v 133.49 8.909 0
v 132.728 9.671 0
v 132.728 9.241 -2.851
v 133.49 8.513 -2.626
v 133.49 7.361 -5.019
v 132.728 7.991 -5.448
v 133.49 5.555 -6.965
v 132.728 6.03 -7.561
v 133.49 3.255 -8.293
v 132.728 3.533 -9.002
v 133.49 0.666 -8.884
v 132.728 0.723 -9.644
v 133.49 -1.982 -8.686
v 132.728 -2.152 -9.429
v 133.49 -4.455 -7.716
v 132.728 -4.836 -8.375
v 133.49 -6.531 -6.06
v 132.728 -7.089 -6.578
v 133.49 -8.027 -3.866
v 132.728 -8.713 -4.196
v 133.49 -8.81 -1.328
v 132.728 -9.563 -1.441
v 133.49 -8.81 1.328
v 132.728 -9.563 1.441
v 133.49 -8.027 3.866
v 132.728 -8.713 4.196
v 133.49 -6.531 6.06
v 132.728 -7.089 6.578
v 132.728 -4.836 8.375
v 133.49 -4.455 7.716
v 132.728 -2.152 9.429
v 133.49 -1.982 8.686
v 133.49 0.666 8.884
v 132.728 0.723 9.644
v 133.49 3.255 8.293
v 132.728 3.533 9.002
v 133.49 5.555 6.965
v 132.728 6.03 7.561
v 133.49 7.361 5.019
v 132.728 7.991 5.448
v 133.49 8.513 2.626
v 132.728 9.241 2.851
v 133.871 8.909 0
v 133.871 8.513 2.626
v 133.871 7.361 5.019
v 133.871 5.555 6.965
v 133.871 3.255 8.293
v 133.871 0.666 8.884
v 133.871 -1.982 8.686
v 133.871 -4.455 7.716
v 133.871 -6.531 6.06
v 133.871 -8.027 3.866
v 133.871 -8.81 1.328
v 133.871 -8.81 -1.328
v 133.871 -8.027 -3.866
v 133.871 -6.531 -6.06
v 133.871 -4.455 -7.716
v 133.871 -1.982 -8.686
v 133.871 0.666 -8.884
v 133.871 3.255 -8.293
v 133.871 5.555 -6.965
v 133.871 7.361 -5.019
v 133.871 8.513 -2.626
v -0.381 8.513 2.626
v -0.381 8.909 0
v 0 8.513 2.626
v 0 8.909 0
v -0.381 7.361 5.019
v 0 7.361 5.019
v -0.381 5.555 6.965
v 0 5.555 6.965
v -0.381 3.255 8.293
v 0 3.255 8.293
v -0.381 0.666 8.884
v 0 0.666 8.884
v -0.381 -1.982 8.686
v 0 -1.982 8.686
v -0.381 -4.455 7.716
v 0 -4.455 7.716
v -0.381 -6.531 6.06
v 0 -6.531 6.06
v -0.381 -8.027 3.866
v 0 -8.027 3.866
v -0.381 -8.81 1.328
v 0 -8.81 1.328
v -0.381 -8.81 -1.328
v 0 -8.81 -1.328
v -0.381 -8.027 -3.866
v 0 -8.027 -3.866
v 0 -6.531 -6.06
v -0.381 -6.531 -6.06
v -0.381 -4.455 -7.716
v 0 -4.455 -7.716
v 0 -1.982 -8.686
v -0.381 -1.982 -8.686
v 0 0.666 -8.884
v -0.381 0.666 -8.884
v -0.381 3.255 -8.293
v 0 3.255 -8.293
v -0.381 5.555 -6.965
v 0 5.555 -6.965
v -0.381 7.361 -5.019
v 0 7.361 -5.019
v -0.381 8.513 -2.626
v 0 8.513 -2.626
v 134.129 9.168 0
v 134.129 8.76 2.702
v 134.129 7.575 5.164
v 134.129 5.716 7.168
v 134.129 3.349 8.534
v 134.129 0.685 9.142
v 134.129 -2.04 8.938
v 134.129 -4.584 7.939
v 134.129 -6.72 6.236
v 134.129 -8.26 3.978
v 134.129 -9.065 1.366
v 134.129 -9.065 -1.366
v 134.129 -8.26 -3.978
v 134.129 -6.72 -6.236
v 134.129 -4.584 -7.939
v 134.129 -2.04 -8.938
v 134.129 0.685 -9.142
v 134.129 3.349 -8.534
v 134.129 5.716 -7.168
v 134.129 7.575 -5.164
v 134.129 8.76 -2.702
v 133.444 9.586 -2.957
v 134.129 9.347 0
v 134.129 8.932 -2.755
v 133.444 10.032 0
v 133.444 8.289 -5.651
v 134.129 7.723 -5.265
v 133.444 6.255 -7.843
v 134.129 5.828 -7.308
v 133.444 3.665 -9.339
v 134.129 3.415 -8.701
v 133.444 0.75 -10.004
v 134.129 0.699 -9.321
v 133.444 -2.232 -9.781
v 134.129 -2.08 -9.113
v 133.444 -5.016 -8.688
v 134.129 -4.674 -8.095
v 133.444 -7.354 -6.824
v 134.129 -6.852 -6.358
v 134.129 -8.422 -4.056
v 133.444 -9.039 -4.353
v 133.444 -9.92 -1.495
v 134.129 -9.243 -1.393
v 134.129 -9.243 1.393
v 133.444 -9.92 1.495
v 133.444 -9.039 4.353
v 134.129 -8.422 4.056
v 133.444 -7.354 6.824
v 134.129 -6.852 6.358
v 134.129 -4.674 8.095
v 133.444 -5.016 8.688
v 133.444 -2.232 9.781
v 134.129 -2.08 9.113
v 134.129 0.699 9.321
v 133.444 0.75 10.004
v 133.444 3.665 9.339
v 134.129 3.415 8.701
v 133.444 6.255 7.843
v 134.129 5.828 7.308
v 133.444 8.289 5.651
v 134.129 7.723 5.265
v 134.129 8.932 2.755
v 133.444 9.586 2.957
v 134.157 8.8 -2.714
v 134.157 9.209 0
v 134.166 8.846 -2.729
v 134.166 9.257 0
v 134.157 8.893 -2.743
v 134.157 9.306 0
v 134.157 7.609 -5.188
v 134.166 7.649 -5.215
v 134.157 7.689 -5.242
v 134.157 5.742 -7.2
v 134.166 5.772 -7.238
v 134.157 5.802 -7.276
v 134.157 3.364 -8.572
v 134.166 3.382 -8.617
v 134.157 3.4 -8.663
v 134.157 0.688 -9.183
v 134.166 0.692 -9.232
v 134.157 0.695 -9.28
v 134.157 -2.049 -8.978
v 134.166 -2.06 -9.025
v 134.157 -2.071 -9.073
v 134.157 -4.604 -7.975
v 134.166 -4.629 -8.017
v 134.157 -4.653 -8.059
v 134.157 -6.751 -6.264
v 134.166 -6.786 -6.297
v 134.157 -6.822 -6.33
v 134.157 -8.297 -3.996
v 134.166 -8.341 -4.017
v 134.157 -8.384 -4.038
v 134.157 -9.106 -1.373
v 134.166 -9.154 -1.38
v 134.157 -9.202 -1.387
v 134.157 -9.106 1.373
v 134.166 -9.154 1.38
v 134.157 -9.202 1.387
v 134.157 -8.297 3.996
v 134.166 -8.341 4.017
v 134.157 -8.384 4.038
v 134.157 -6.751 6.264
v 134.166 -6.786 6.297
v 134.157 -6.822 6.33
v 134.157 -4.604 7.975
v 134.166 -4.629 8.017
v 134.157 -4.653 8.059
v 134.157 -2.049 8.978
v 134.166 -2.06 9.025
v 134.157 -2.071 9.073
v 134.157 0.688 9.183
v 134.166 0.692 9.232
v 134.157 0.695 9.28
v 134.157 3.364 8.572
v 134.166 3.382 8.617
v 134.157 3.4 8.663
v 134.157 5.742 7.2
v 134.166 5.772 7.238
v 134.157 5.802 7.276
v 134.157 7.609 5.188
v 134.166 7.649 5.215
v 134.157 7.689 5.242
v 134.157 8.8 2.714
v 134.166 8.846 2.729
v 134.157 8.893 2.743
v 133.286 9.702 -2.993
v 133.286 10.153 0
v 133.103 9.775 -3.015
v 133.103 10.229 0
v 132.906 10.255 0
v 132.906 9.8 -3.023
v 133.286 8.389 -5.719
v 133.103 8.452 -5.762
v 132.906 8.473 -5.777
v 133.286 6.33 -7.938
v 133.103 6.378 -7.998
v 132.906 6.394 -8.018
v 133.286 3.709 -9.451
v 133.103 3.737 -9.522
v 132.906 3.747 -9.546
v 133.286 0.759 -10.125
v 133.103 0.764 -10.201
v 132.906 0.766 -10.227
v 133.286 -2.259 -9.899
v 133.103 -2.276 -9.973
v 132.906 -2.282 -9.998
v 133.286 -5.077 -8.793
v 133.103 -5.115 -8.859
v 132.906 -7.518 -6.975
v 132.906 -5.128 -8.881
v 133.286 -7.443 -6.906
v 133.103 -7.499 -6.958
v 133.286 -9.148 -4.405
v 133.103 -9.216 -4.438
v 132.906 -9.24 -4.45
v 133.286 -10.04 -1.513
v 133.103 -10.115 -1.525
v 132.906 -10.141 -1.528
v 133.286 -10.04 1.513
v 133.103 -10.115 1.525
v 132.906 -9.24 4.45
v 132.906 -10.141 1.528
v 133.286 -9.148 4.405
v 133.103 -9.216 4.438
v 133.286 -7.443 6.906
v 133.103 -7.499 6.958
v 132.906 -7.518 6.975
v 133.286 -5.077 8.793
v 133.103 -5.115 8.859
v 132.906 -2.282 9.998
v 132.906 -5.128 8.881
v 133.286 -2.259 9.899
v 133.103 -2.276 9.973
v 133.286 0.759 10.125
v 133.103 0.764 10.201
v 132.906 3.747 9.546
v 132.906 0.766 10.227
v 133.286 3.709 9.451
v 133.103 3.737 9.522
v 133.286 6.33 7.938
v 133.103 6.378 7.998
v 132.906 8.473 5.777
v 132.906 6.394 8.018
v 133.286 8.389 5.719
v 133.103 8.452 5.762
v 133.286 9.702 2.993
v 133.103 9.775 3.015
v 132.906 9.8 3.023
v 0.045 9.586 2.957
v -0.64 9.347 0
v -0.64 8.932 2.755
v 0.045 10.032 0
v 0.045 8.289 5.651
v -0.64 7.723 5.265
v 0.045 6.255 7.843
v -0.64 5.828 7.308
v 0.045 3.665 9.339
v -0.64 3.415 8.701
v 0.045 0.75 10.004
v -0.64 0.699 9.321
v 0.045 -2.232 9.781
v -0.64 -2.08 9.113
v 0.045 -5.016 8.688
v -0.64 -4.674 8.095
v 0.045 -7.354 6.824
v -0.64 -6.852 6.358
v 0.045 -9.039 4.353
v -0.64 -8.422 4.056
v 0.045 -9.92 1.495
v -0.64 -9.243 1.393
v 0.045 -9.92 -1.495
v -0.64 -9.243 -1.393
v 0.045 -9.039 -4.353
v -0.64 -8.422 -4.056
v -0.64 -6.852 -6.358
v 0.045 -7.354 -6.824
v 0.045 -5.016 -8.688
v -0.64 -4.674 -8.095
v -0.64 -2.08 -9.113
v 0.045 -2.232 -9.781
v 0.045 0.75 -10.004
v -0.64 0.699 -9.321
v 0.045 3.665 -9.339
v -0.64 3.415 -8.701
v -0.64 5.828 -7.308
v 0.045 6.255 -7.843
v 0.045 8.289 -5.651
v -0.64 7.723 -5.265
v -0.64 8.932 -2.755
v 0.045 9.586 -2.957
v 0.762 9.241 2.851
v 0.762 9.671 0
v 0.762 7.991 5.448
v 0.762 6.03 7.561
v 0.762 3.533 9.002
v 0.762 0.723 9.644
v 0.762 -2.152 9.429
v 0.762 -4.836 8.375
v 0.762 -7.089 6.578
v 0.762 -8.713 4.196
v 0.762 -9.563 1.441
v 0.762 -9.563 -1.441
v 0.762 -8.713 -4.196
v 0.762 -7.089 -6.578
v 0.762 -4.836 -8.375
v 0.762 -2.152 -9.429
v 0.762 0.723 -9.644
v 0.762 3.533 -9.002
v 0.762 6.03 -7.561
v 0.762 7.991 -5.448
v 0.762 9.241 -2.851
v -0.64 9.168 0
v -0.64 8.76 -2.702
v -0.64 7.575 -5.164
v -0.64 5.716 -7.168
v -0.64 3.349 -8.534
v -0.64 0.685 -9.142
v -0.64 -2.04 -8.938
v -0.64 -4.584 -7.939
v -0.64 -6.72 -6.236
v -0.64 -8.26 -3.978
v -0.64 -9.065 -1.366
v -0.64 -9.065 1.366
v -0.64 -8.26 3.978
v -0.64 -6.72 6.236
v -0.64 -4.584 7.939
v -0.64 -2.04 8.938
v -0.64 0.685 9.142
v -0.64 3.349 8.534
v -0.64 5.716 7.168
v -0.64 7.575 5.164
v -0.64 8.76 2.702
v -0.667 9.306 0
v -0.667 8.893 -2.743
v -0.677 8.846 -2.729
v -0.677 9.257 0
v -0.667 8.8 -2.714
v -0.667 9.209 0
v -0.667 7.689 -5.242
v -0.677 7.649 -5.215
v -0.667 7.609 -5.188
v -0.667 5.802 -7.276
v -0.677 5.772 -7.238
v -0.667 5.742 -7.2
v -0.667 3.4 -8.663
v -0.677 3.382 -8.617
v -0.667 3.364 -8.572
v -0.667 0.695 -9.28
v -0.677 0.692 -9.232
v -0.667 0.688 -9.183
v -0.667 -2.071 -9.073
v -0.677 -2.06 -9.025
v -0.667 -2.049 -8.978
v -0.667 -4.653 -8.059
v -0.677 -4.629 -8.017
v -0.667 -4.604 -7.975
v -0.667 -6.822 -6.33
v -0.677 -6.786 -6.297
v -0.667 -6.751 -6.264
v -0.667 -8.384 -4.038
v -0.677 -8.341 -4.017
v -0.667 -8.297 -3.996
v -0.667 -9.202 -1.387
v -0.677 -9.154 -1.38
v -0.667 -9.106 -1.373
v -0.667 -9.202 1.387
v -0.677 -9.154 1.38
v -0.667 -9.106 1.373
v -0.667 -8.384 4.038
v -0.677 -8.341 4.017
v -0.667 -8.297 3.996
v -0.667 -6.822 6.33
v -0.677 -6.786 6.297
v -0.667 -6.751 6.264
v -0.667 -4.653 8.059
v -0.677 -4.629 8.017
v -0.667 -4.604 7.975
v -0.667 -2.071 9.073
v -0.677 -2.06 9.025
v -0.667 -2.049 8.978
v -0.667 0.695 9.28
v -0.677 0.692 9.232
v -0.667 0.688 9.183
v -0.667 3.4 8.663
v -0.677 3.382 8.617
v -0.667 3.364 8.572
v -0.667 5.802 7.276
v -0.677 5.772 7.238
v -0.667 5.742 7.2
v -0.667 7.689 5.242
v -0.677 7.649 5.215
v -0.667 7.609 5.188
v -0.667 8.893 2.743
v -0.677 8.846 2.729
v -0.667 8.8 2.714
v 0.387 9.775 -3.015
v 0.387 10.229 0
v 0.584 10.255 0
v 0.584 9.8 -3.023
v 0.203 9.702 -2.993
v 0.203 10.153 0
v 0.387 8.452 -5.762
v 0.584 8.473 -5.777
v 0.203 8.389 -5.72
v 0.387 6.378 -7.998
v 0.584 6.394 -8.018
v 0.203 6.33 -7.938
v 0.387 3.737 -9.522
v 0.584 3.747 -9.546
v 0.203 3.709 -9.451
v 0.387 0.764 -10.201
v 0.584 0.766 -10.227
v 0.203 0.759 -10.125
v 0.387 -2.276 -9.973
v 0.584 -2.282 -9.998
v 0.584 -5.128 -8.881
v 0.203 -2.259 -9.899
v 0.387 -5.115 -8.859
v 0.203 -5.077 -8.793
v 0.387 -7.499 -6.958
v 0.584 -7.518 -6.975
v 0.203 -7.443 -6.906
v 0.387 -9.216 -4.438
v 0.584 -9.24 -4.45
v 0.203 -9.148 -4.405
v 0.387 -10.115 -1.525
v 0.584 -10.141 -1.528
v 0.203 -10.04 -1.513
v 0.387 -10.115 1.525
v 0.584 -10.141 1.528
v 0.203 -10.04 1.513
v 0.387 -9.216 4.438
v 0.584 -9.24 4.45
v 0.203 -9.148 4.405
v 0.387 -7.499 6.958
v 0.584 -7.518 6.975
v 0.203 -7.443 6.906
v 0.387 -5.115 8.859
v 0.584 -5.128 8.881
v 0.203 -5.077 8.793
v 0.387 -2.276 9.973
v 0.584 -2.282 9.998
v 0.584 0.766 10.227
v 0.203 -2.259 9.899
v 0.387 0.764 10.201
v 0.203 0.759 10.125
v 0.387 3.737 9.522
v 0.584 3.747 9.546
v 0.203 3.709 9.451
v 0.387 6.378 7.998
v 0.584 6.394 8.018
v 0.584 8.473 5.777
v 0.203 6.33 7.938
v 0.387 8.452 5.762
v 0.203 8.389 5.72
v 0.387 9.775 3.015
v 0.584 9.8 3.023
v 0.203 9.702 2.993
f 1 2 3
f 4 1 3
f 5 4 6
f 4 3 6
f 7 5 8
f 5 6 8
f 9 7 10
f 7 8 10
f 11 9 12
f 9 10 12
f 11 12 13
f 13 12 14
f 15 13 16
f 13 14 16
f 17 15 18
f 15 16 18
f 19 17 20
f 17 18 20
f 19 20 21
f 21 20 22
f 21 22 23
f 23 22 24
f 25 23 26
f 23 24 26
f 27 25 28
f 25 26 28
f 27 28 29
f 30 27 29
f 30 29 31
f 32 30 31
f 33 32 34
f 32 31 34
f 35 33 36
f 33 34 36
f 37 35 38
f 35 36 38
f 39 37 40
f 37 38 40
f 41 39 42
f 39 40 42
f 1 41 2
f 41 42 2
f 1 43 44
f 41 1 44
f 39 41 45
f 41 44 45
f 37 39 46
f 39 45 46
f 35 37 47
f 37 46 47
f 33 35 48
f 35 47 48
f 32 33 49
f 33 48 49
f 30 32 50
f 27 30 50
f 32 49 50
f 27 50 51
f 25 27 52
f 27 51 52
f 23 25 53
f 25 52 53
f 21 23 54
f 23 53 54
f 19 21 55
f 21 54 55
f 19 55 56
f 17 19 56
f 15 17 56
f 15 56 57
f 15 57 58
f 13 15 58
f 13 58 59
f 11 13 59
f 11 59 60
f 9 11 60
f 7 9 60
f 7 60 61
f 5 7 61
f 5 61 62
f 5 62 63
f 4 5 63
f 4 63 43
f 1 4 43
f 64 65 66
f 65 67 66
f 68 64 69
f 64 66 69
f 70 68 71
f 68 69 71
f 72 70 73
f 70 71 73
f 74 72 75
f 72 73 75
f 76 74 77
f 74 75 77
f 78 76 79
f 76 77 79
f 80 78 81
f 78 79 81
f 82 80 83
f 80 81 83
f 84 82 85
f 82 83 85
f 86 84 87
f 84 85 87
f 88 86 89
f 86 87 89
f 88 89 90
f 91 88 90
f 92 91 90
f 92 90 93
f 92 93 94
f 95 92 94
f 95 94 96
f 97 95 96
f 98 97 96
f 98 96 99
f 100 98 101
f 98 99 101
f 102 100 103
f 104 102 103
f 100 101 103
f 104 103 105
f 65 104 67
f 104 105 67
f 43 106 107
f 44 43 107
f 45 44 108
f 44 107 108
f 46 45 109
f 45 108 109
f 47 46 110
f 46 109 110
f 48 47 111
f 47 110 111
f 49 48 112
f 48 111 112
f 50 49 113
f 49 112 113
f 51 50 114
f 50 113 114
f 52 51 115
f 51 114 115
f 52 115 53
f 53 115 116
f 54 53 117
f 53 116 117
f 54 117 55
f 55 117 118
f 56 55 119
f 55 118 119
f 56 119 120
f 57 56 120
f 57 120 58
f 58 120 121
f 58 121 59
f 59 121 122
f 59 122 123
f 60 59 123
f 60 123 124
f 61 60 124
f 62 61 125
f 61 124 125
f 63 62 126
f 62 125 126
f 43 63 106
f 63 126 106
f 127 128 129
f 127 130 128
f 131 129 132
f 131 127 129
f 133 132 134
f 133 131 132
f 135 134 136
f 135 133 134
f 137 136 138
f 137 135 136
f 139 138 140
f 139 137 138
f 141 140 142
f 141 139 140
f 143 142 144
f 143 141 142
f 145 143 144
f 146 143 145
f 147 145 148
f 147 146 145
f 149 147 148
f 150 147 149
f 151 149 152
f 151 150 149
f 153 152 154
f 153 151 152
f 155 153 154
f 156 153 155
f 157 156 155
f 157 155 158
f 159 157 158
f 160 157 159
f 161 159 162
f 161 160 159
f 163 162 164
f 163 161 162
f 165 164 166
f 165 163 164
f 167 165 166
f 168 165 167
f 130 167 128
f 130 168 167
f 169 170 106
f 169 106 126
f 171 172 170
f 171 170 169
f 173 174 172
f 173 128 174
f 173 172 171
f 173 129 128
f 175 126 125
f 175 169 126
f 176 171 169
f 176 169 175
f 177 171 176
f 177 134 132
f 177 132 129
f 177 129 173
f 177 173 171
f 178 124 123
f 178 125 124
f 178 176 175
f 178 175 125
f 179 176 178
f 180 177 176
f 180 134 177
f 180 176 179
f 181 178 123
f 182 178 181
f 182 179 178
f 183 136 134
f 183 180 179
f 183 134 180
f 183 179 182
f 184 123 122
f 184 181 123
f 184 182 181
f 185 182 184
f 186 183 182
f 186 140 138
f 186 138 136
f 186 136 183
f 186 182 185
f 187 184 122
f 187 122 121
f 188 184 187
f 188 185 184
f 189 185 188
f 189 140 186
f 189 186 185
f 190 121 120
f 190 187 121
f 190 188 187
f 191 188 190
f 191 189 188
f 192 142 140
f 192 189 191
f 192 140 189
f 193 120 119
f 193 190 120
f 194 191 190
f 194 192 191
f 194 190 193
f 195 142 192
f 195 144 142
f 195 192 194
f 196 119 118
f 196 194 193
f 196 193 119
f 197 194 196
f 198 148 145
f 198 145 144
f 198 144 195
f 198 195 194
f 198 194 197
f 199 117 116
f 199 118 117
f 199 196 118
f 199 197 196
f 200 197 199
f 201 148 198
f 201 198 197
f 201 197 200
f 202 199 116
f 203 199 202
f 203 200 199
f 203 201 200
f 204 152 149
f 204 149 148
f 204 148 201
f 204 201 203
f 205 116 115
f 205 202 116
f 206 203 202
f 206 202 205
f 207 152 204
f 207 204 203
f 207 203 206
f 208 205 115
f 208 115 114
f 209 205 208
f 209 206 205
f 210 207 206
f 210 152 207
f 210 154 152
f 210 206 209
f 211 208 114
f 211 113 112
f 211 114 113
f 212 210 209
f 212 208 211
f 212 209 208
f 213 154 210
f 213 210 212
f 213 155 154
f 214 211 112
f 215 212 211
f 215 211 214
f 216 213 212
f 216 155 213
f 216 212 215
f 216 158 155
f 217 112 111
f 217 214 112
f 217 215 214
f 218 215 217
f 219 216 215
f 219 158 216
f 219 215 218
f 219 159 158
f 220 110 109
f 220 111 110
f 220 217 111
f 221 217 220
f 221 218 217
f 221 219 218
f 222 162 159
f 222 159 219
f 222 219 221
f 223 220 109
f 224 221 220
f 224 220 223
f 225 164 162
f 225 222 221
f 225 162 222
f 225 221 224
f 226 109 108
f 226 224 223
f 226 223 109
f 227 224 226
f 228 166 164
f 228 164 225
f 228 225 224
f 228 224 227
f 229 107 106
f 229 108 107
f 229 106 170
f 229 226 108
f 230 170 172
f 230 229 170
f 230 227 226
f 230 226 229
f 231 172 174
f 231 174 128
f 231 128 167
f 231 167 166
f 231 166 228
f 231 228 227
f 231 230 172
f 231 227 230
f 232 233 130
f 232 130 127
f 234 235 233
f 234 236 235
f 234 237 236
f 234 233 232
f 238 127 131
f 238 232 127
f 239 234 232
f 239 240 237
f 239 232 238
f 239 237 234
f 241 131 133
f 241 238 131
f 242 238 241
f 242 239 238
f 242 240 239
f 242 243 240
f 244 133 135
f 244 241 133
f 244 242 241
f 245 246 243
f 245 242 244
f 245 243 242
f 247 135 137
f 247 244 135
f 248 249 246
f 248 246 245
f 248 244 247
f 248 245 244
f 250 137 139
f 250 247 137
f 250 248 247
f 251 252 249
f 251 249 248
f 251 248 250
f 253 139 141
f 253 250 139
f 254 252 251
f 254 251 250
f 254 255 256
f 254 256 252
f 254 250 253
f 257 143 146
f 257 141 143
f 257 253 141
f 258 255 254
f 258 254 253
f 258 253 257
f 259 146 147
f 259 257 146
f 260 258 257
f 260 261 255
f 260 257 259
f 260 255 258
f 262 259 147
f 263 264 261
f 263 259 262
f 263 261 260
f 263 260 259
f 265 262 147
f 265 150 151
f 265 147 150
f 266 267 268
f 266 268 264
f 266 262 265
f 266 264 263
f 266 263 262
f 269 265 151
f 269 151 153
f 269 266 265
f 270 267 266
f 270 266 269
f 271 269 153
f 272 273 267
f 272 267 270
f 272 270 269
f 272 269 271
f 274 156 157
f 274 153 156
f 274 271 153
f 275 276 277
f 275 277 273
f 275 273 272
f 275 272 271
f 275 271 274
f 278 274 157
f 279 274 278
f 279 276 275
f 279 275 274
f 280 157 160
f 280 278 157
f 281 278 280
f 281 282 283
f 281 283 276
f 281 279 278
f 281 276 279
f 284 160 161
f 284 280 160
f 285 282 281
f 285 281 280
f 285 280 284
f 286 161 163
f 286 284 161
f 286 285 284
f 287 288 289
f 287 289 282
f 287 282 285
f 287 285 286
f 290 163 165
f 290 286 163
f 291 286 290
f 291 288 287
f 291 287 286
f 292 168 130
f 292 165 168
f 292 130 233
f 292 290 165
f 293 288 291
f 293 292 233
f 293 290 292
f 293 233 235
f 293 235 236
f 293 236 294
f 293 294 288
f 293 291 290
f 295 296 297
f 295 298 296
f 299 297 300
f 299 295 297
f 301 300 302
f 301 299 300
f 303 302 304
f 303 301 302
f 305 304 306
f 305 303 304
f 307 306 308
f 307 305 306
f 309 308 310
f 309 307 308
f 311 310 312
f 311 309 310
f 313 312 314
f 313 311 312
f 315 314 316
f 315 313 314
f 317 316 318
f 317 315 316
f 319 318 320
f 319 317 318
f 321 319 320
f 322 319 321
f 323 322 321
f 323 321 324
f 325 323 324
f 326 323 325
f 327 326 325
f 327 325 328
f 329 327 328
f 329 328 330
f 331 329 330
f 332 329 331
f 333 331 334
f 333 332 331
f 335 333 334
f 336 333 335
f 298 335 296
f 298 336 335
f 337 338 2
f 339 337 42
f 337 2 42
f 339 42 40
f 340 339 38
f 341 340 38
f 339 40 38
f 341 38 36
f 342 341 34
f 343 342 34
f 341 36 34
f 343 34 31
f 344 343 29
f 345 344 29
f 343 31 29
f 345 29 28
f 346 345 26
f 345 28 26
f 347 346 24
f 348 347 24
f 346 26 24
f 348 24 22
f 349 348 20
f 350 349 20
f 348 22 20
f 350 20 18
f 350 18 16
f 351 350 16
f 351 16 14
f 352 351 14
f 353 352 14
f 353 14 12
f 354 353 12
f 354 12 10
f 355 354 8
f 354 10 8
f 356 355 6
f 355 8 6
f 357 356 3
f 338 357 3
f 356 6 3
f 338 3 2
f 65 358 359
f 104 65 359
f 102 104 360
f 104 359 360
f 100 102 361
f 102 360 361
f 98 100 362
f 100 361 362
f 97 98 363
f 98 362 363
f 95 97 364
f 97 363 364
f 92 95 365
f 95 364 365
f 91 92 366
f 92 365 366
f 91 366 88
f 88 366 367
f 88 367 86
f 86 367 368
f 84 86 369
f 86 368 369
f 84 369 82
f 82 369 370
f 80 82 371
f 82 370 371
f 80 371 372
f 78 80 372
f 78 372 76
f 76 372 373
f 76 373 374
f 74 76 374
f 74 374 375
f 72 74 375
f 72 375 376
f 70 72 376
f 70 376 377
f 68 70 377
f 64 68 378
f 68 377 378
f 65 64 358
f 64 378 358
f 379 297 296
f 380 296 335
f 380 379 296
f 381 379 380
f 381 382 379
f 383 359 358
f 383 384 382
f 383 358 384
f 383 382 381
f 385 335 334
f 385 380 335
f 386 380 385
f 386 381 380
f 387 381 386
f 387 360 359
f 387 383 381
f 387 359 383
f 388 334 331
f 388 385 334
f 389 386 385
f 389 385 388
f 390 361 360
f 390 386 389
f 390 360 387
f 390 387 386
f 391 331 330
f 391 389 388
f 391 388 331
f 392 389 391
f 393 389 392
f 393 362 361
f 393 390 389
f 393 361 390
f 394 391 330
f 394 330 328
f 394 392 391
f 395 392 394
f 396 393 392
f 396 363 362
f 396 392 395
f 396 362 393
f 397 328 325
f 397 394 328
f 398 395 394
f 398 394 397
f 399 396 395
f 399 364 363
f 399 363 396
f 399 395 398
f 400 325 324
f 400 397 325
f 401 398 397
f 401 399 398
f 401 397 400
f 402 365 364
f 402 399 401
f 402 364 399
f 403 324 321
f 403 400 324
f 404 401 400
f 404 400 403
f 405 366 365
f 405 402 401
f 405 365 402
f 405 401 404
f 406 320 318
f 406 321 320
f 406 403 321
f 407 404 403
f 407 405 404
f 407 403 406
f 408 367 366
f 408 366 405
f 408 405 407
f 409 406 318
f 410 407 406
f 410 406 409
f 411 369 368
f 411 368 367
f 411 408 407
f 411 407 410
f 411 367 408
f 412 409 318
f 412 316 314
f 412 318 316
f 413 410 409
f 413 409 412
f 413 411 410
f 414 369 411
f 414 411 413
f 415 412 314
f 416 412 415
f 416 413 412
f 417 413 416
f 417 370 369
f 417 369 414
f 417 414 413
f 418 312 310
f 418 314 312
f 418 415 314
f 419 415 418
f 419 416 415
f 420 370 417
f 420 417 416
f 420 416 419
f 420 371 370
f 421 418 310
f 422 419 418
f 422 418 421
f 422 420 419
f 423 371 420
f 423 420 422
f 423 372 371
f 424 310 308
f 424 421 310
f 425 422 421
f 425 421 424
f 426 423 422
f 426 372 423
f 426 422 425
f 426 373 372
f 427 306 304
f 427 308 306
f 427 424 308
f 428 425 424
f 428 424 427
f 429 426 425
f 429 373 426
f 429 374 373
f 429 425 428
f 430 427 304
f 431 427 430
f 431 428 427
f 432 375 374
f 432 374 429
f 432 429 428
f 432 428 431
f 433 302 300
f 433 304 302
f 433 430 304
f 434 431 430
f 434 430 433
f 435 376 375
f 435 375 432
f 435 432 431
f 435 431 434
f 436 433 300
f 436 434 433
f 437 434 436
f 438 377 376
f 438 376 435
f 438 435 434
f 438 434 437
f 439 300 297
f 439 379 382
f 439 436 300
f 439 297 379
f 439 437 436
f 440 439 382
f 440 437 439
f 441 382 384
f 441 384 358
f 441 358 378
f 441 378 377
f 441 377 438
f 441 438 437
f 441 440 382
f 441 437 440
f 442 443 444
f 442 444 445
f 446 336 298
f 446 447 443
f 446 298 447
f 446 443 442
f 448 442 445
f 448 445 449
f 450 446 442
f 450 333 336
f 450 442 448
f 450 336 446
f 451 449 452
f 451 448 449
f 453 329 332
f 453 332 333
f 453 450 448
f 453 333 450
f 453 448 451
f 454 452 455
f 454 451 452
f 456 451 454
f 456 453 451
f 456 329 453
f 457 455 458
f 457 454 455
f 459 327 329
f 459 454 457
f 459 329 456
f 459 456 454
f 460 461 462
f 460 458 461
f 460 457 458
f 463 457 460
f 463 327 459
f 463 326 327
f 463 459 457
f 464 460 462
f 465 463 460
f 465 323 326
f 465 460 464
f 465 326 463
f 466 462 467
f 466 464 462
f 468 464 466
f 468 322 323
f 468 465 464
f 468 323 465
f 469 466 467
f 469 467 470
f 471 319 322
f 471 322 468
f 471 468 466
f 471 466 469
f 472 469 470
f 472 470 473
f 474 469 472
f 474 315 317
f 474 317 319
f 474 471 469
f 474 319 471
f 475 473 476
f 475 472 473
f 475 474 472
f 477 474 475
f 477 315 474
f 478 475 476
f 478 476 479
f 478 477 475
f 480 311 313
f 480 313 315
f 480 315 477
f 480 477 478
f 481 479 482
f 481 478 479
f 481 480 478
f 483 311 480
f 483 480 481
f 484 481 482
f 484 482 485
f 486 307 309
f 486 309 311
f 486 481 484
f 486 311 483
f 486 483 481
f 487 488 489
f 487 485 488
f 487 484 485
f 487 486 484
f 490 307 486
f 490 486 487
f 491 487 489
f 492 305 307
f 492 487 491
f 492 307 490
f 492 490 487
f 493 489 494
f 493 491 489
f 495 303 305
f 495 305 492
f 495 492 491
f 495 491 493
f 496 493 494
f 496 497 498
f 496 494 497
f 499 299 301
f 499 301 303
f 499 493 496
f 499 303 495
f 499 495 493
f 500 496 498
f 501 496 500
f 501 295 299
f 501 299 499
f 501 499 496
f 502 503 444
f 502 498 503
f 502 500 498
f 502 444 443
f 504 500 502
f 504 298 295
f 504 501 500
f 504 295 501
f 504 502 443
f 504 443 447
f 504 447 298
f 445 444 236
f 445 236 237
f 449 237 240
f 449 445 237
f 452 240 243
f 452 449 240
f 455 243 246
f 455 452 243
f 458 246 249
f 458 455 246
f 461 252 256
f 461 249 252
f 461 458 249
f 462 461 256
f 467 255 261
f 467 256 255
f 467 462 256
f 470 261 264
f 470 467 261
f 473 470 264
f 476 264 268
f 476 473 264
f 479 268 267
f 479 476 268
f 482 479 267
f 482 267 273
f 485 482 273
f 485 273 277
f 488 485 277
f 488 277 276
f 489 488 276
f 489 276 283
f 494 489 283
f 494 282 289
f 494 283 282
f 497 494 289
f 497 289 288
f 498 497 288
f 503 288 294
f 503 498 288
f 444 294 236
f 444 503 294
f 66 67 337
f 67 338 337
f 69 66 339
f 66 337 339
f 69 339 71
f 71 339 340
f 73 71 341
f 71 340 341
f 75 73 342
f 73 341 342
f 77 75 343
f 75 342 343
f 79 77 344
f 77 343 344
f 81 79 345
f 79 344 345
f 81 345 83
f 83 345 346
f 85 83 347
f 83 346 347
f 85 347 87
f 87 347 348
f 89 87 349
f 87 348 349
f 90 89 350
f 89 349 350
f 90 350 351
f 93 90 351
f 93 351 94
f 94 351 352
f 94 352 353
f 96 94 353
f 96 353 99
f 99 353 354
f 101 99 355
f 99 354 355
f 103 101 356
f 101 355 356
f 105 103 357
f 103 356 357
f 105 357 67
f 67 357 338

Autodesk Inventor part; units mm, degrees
sketch "Sketch_1" plane through (0, 0, 0) normal (0, 0, 1) x (1, 0, 0)
  line L0 (133.4897, 0) -> (0, 0)
  arc A0 (-0.6395, 9.3472) -> (-0.6395, 9.1676) centre (-0.5497, 9.2574) ccw
  line L1 (-0.6395, 9.1676) -> (-0.381, 8.9091)
  line L2 (-0.381, 8.9091) -> (0, 8.9091)
  line L3 (0, 8.9091) -> (0.762, 9.671)
  line L4 (0.762, 9.671) -> (132.7277, 9.671)
  line L5 (132.7277, 9.671) -> (133.4897, 8.9091)
  line L6 (133.4897, 8.9091) -> (133.8707, 8.9091)
  line L7 (133.8707, 8.9091) -> (134.1292, 9.1676)
  arc A1 (134.1292, 9.1676) -> (134.1292, 9.3472) centre (134.0394, 9.2574) ccw
  line L8 (134.1292, 9.3472) -> (133.4443, 10.0321)
  arc A2 (133.4443, 10.0321) -> (132.9055, 10.2553) centre (132.9055, 9.4933) ccw
  line L9 (132.9055, 10.2553) -> (0.5842, 10.2553)
  arc A3 (0.5842, 10.2553) -> (0.0454, 10.0321) centre (0.5842, 9.4933) ccw
  line L10 (0.0454, 10.0321) -> (-0.6395, 9.3472)
revolve "Revolution1" add sketch "Sketch_1" angle 360 about axis through (133.4897, 0, 0) along (1, 0, 0)
ref_plane "cp1_XY" through (66.7449, 10.2553, 0) normal (1, 0, 0) x (0, 0, -1)
ref_plane "cp1_YZ" through (66.7449, 10.2553, 0) normal (0, 0, -1) x (0, 1, 0)
ref_plane "cp1_ZX" through (66.7449, 10.2553, 0) normal (0, 1, 0) x (1, 0, 0)
ref_plane "cp2_XY" through (66.7449, 0, -10.2553) normal (1, 0, 0) x (0, 0, -1)
ref_plane "cp2_YZ" through (66.7449, 0, -10.2553) normal (0, 0, -1) x (0, 1, 0)
ref_plane "cp2_ZX" through (66.7449, 0, -10.2553) normal (0, 1, 0) x (1, 0, 0)
ref_plane "cp3_XY" through (66.7449, -10.2553, 0) normal (1, 0, 0) x (0, 0, -1)
ref_plane "cp3_YZ" through (66.7449, -10.2553, 0) normal (0, 0, -1) x (0, 1, 0)
ref_plane "cp3_ZX" through (66.7449, -10.2553, 0) normal (0, 1, 0) x (1, 0, 0)
ref_plane "cp4_XY" through (66.7449, 0, 10.2553) normal (1, 0, 0) x (0, 0, -1)
ref_plane "cp4_YZ" through (66.7449, 0, 10.2553) normal (0, 0, -1) x (0, 1, 0)
ref_plane "cp4_ZX" through (66.7449, 0, 10.2553) normal (0, 1, 0) x (1, 0, 0)
ref_plane "tube_front_XY" through (0, 0, 0) normal (1, 0, 0) x (0, 0, -1)
ref_plane "tube_front_YZ" through (0, 0, 0) normal (0, 0, -1) x (0, 1, 0)
ref_plane "tube_front_ZX" through (0, 0, 0) normal (0, 1, 0) x (1, 0, 0)
ref_plane "tube_rear_XY" through (133.4897, 0, 0) normal (1, 0, 0) x (0, 0, -1)
ref_plane "tube_rear_YZ" through (133.4897, 0, 0) normal (0, 0, -1) x (0, 1, 0)
ref_plane "tube_rear_ZX" through (133.4897, 0, 0) normal (0, 1, 0) x (1, 0, 0)
properties part number "04R-5.25550C"
